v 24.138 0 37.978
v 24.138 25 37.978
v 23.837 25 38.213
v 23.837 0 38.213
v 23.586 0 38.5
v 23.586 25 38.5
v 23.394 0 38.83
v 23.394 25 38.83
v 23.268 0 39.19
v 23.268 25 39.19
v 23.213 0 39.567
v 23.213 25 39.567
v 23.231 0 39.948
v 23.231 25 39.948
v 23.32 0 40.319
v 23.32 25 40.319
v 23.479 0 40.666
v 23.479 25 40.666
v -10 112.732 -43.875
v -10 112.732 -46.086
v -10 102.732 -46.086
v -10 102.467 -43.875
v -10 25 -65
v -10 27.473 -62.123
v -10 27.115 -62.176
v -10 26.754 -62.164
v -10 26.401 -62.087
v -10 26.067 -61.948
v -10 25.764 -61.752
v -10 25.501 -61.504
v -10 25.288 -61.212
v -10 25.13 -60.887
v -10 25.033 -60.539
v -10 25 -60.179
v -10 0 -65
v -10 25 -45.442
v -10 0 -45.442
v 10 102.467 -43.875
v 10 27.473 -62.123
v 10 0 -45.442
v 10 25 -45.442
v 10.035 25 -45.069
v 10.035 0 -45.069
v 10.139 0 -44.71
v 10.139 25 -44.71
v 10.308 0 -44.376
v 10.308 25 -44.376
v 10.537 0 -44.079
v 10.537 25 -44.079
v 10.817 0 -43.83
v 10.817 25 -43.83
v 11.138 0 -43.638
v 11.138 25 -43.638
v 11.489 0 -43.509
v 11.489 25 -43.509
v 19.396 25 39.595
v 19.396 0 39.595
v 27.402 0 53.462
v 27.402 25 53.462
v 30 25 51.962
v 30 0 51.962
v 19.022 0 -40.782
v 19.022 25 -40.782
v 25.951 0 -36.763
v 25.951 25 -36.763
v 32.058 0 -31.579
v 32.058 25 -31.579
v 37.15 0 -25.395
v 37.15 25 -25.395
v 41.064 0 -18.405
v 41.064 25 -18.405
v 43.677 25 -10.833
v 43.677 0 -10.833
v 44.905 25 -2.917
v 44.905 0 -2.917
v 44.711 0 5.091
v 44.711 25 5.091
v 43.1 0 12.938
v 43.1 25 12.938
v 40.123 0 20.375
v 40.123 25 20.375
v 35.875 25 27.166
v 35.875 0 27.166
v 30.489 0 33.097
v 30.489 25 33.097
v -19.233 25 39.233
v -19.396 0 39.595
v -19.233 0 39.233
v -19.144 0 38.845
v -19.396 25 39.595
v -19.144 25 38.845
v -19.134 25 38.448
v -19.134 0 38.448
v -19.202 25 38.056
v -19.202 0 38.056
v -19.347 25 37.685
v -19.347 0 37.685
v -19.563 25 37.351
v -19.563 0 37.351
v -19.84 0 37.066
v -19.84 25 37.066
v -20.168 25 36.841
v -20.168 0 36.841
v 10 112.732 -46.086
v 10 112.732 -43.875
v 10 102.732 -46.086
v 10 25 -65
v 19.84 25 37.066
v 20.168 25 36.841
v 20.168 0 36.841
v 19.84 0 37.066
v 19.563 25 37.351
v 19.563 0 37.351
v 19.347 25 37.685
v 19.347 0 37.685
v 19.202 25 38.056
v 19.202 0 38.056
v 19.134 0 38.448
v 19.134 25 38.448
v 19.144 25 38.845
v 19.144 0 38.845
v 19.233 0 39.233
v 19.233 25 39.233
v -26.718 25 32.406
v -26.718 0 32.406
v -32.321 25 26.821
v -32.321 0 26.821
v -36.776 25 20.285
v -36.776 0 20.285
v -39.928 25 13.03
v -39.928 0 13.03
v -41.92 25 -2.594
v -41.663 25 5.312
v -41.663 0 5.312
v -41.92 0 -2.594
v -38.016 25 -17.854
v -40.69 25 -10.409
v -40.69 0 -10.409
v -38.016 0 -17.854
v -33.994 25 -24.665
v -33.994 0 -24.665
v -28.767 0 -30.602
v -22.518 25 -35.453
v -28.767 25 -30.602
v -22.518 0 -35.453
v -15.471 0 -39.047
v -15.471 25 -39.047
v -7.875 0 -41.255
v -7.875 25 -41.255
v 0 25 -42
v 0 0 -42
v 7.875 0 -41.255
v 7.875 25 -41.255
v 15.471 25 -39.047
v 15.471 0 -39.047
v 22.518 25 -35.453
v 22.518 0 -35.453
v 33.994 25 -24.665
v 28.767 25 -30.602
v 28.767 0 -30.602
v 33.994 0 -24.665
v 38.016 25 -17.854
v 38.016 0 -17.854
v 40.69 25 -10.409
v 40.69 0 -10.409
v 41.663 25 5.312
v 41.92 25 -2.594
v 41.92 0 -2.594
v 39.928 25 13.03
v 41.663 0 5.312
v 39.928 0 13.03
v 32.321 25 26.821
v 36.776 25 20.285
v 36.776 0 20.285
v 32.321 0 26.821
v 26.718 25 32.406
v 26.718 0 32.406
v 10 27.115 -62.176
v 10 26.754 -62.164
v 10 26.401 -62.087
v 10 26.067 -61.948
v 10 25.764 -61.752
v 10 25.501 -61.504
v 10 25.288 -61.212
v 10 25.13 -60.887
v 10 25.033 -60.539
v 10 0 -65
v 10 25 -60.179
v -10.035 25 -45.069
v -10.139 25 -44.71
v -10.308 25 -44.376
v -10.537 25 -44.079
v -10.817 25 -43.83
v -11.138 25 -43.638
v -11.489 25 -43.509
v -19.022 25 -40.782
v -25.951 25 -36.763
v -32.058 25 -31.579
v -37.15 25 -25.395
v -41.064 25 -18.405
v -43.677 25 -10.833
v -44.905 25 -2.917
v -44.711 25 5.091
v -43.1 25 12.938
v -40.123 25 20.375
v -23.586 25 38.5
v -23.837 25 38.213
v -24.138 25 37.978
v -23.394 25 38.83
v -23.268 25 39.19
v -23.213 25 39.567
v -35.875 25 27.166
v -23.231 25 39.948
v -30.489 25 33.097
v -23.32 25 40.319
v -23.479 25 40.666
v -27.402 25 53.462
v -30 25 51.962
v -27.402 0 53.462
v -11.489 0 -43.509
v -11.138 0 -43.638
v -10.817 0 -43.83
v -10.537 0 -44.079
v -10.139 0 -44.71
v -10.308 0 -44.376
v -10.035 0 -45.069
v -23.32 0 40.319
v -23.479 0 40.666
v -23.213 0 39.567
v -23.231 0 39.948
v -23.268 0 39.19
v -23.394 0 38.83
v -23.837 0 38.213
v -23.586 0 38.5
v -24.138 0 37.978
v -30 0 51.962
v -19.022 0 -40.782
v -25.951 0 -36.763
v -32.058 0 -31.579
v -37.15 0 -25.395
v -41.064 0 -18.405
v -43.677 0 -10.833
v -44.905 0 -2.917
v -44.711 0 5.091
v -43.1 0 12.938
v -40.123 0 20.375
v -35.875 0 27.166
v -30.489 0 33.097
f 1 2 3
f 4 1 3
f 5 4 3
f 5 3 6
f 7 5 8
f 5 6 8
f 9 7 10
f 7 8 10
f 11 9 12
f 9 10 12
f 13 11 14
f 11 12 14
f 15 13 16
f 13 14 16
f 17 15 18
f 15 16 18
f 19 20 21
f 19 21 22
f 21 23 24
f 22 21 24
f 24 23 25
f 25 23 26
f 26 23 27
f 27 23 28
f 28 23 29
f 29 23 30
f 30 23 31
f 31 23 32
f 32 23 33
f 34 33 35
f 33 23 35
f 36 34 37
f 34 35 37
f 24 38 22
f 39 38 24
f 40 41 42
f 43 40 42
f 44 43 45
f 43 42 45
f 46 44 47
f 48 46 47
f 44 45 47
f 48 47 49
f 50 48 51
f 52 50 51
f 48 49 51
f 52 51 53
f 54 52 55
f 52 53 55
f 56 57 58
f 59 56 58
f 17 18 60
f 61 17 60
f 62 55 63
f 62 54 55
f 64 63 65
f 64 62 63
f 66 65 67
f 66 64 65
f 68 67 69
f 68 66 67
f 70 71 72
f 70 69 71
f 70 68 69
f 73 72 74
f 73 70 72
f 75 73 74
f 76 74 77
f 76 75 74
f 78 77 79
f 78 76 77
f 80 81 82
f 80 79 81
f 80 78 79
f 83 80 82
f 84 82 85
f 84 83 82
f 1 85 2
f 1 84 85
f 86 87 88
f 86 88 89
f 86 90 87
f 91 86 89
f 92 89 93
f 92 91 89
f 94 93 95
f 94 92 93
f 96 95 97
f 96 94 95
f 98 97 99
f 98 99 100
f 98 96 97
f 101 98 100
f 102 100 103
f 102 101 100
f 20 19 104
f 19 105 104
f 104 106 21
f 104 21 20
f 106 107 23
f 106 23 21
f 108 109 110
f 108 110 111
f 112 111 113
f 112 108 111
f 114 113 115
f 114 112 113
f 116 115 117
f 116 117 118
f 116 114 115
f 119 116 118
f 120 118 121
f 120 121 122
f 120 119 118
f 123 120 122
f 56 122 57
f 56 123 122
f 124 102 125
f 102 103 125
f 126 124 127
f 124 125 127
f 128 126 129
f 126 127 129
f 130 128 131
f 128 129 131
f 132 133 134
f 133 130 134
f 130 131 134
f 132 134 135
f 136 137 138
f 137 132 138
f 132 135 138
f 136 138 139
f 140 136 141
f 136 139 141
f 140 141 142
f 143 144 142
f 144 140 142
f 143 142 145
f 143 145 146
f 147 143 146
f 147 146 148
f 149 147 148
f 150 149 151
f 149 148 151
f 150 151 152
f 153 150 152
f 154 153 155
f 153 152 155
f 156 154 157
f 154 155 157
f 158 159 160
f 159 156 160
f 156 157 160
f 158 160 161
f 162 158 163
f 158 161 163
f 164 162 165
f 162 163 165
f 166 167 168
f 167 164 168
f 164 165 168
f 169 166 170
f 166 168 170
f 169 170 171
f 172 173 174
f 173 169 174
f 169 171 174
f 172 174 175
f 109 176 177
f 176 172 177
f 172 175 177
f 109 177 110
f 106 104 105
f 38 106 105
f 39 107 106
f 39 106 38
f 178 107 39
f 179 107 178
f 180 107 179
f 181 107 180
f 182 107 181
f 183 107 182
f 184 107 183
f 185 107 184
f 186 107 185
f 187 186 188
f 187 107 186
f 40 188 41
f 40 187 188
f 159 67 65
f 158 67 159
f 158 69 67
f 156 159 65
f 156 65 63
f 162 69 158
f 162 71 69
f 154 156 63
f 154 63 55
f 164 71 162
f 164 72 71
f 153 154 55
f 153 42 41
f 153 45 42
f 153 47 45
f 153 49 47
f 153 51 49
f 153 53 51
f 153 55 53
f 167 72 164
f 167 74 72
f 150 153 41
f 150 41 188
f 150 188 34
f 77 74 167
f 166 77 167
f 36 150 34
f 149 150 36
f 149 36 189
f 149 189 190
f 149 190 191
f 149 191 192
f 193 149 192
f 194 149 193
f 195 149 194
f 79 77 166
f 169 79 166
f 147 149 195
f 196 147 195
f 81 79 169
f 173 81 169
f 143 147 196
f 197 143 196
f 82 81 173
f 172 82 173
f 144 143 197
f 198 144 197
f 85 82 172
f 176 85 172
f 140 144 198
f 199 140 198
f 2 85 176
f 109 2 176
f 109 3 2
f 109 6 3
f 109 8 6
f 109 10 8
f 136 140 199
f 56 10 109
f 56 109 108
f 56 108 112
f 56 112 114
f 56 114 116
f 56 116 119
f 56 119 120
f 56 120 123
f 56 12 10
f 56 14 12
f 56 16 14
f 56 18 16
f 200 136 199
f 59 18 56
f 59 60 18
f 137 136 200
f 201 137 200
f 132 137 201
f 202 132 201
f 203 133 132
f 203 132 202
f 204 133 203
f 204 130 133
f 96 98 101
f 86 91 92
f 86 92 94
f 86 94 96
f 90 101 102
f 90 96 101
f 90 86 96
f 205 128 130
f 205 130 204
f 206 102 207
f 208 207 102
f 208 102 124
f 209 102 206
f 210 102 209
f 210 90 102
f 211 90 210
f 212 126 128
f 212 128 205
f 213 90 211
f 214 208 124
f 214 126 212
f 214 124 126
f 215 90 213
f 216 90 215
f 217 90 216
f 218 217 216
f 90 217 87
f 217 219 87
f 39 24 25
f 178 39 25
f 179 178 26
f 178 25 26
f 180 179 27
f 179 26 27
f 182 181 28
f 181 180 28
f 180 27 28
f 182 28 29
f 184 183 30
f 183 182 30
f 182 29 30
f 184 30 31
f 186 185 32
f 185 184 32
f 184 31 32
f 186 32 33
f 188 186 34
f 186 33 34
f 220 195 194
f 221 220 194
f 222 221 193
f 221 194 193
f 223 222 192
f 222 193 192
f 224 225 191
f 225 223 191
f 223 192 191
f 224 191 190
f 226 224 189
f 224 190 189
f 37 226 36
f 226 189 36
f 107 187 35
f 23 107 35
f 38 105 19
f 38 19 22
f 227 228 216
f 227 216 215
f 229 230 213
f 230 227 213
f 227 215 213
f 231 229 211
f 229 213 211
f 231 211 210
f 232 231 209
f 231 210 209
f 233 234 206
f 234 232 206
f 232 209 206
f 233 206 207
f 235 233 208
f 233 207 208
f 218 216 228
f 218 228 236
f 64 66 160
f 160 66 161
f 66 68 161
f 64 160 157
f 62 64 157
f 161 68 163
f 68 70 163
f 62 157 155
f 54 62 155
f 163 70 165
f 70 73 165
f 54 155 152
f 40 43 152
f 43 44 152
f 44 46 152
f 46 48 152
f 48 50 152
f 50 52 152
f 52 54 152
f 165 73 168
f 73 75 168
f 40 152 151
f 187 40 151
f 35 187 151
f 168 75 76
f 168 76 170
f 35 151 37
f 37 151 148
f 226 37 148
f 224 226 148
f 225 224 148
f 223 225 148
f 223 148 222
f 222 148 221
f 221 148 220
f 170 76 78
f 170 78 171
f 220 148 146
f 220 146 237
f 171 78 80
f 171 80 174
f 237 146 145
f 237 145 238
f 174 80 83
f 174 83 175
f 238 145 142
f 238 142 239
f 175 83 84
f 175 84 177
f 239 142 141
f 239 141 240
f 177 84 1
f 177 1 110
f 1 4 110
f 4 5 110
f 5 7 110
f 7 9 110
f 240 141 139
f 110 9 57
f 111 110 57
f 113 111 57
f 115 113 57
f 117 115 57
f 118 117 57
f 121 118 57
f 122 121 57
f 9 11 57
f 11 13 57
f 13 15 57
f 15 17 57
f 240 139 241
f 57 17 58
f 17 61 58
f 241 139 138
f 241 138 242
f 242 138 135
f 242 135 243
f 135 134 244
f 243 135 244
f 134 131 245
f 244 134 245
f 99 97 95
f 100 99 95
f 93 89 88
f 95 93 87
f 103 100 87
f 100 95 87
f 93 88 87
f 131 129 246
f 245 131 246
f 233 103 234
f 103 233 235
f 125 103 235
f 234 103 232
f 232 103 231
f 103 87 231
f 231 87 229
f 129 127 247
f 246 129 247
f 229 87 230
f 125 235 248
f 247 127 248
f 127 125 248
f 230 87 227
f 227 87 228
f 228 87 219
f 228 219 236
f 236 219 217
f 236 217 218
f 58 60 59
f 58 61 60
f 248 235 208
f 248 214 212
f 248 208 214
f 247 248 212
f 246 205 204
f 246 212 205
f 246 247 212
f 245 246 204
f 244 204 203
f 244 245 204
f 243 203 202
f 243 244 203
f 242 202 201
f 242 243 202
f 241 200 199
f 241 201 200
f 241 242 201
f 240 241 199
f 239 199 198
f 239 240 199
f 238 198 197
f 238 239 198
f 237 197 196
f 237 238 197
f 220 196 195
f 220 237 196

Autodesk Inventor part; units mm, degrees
ref_plane "YZ Plane" through (0, 0, 0) normal (1, 0, 0) x (0, 1, 0)
ref_plane "XZ Plane" through (0, 0, 0) normal (0, 1, 0) x (-1, 0, 0)
ref_plane "XY Plane" through (0, 0, 0) normal (0, 0, 1) x (1, 0, 0)
sketch "Esquisse1" plane through (0, 0, 0) normal (0, 1, 0) x (-1, 0, 0)
  line L0 (22.5, 38.9711) -> (30, 51.9615)
  line L1 (0, 0) -> (55, 0) construction
  line L2 (-22.5, 38.9711) -> (-30, 51.9615)
  line L3 (0, 0) -> (55, 0) construction
  line L4 (0, -65) -> (10, -65)
  line L5 (10, -65) -> (10, -43.8748)
  line L6 (0, -65) -> (-10, -65)
  line L7 (-10, -65) -> (-10, -43.8748)
  line L8 (27.4019, 53.4615) -> (18.3483, 37.7802)
  arc A0 (-18.3483, 37.7802) -> (18.3483, 37.7802) centre (0, 0) ccw
  line L9 (-18.3483, 37.7802) -> (-27.4019, 53.4615)
  line L10 (27.4019, 53.4615) -> (30, 51.9615)
  line L11 (-30, 51.9615) -> (-27.4019, 53.4615)
  arc A1 (-22.5, 38.9711) -> (-10, -43.8748) centre (0, 0) ccw
  arc A2 (10, -43.8748) -> (22.5, 38.9711) centre (0, 0) ccw
  dimension "d1" = 60
  dimension "d2" = 60
  dimension "d3" = 60
  dimension "d4" = 120
extrude "Extrusion1" add sketch "Esquisse1" along normal blind 25
sketch "Esquisse2" plane through (10, 0, -43.8748) normal (1, 0, 0) x (0, 0, -1)
  line L0 (0, 25) -> (21.1252, 25) projected
  line L1 (21.1252, 25) -> (2.2112, 102.732)
  line L2 (2.2112, 102.732) -> (2.2112, 112.732)
  line L3 (0, 112.732) -> (0, 102.4668)
  line L4 (0, 102.4668) -> (18.8494, 25)
  line L5 (0, 112.732) -> (2.2112, 112.732)
  point P0 (-43.8748, 0)
  dimension "d11" = 80
  dimension "d12" = 10
extrude "Extrusion2" add sketch "Esquisse2" against normal blind 20
fillet "Congé1" radius 2 1 edges at (0, 25, -62.7243)
fillet "Congé2" radius 2 2 edges at (10, 12.5, -43.8748) (-10, 12.5, -43.8748)
fillet "Congé3" radius 2 4 edges at (18.3483, 12.5, 37.7802) (-18.3483, 12.5, 37.7802) (22.5, 12.5, 38.9711) (-22.5, 12.5, 38.9711)
properties part number "omikuji"
